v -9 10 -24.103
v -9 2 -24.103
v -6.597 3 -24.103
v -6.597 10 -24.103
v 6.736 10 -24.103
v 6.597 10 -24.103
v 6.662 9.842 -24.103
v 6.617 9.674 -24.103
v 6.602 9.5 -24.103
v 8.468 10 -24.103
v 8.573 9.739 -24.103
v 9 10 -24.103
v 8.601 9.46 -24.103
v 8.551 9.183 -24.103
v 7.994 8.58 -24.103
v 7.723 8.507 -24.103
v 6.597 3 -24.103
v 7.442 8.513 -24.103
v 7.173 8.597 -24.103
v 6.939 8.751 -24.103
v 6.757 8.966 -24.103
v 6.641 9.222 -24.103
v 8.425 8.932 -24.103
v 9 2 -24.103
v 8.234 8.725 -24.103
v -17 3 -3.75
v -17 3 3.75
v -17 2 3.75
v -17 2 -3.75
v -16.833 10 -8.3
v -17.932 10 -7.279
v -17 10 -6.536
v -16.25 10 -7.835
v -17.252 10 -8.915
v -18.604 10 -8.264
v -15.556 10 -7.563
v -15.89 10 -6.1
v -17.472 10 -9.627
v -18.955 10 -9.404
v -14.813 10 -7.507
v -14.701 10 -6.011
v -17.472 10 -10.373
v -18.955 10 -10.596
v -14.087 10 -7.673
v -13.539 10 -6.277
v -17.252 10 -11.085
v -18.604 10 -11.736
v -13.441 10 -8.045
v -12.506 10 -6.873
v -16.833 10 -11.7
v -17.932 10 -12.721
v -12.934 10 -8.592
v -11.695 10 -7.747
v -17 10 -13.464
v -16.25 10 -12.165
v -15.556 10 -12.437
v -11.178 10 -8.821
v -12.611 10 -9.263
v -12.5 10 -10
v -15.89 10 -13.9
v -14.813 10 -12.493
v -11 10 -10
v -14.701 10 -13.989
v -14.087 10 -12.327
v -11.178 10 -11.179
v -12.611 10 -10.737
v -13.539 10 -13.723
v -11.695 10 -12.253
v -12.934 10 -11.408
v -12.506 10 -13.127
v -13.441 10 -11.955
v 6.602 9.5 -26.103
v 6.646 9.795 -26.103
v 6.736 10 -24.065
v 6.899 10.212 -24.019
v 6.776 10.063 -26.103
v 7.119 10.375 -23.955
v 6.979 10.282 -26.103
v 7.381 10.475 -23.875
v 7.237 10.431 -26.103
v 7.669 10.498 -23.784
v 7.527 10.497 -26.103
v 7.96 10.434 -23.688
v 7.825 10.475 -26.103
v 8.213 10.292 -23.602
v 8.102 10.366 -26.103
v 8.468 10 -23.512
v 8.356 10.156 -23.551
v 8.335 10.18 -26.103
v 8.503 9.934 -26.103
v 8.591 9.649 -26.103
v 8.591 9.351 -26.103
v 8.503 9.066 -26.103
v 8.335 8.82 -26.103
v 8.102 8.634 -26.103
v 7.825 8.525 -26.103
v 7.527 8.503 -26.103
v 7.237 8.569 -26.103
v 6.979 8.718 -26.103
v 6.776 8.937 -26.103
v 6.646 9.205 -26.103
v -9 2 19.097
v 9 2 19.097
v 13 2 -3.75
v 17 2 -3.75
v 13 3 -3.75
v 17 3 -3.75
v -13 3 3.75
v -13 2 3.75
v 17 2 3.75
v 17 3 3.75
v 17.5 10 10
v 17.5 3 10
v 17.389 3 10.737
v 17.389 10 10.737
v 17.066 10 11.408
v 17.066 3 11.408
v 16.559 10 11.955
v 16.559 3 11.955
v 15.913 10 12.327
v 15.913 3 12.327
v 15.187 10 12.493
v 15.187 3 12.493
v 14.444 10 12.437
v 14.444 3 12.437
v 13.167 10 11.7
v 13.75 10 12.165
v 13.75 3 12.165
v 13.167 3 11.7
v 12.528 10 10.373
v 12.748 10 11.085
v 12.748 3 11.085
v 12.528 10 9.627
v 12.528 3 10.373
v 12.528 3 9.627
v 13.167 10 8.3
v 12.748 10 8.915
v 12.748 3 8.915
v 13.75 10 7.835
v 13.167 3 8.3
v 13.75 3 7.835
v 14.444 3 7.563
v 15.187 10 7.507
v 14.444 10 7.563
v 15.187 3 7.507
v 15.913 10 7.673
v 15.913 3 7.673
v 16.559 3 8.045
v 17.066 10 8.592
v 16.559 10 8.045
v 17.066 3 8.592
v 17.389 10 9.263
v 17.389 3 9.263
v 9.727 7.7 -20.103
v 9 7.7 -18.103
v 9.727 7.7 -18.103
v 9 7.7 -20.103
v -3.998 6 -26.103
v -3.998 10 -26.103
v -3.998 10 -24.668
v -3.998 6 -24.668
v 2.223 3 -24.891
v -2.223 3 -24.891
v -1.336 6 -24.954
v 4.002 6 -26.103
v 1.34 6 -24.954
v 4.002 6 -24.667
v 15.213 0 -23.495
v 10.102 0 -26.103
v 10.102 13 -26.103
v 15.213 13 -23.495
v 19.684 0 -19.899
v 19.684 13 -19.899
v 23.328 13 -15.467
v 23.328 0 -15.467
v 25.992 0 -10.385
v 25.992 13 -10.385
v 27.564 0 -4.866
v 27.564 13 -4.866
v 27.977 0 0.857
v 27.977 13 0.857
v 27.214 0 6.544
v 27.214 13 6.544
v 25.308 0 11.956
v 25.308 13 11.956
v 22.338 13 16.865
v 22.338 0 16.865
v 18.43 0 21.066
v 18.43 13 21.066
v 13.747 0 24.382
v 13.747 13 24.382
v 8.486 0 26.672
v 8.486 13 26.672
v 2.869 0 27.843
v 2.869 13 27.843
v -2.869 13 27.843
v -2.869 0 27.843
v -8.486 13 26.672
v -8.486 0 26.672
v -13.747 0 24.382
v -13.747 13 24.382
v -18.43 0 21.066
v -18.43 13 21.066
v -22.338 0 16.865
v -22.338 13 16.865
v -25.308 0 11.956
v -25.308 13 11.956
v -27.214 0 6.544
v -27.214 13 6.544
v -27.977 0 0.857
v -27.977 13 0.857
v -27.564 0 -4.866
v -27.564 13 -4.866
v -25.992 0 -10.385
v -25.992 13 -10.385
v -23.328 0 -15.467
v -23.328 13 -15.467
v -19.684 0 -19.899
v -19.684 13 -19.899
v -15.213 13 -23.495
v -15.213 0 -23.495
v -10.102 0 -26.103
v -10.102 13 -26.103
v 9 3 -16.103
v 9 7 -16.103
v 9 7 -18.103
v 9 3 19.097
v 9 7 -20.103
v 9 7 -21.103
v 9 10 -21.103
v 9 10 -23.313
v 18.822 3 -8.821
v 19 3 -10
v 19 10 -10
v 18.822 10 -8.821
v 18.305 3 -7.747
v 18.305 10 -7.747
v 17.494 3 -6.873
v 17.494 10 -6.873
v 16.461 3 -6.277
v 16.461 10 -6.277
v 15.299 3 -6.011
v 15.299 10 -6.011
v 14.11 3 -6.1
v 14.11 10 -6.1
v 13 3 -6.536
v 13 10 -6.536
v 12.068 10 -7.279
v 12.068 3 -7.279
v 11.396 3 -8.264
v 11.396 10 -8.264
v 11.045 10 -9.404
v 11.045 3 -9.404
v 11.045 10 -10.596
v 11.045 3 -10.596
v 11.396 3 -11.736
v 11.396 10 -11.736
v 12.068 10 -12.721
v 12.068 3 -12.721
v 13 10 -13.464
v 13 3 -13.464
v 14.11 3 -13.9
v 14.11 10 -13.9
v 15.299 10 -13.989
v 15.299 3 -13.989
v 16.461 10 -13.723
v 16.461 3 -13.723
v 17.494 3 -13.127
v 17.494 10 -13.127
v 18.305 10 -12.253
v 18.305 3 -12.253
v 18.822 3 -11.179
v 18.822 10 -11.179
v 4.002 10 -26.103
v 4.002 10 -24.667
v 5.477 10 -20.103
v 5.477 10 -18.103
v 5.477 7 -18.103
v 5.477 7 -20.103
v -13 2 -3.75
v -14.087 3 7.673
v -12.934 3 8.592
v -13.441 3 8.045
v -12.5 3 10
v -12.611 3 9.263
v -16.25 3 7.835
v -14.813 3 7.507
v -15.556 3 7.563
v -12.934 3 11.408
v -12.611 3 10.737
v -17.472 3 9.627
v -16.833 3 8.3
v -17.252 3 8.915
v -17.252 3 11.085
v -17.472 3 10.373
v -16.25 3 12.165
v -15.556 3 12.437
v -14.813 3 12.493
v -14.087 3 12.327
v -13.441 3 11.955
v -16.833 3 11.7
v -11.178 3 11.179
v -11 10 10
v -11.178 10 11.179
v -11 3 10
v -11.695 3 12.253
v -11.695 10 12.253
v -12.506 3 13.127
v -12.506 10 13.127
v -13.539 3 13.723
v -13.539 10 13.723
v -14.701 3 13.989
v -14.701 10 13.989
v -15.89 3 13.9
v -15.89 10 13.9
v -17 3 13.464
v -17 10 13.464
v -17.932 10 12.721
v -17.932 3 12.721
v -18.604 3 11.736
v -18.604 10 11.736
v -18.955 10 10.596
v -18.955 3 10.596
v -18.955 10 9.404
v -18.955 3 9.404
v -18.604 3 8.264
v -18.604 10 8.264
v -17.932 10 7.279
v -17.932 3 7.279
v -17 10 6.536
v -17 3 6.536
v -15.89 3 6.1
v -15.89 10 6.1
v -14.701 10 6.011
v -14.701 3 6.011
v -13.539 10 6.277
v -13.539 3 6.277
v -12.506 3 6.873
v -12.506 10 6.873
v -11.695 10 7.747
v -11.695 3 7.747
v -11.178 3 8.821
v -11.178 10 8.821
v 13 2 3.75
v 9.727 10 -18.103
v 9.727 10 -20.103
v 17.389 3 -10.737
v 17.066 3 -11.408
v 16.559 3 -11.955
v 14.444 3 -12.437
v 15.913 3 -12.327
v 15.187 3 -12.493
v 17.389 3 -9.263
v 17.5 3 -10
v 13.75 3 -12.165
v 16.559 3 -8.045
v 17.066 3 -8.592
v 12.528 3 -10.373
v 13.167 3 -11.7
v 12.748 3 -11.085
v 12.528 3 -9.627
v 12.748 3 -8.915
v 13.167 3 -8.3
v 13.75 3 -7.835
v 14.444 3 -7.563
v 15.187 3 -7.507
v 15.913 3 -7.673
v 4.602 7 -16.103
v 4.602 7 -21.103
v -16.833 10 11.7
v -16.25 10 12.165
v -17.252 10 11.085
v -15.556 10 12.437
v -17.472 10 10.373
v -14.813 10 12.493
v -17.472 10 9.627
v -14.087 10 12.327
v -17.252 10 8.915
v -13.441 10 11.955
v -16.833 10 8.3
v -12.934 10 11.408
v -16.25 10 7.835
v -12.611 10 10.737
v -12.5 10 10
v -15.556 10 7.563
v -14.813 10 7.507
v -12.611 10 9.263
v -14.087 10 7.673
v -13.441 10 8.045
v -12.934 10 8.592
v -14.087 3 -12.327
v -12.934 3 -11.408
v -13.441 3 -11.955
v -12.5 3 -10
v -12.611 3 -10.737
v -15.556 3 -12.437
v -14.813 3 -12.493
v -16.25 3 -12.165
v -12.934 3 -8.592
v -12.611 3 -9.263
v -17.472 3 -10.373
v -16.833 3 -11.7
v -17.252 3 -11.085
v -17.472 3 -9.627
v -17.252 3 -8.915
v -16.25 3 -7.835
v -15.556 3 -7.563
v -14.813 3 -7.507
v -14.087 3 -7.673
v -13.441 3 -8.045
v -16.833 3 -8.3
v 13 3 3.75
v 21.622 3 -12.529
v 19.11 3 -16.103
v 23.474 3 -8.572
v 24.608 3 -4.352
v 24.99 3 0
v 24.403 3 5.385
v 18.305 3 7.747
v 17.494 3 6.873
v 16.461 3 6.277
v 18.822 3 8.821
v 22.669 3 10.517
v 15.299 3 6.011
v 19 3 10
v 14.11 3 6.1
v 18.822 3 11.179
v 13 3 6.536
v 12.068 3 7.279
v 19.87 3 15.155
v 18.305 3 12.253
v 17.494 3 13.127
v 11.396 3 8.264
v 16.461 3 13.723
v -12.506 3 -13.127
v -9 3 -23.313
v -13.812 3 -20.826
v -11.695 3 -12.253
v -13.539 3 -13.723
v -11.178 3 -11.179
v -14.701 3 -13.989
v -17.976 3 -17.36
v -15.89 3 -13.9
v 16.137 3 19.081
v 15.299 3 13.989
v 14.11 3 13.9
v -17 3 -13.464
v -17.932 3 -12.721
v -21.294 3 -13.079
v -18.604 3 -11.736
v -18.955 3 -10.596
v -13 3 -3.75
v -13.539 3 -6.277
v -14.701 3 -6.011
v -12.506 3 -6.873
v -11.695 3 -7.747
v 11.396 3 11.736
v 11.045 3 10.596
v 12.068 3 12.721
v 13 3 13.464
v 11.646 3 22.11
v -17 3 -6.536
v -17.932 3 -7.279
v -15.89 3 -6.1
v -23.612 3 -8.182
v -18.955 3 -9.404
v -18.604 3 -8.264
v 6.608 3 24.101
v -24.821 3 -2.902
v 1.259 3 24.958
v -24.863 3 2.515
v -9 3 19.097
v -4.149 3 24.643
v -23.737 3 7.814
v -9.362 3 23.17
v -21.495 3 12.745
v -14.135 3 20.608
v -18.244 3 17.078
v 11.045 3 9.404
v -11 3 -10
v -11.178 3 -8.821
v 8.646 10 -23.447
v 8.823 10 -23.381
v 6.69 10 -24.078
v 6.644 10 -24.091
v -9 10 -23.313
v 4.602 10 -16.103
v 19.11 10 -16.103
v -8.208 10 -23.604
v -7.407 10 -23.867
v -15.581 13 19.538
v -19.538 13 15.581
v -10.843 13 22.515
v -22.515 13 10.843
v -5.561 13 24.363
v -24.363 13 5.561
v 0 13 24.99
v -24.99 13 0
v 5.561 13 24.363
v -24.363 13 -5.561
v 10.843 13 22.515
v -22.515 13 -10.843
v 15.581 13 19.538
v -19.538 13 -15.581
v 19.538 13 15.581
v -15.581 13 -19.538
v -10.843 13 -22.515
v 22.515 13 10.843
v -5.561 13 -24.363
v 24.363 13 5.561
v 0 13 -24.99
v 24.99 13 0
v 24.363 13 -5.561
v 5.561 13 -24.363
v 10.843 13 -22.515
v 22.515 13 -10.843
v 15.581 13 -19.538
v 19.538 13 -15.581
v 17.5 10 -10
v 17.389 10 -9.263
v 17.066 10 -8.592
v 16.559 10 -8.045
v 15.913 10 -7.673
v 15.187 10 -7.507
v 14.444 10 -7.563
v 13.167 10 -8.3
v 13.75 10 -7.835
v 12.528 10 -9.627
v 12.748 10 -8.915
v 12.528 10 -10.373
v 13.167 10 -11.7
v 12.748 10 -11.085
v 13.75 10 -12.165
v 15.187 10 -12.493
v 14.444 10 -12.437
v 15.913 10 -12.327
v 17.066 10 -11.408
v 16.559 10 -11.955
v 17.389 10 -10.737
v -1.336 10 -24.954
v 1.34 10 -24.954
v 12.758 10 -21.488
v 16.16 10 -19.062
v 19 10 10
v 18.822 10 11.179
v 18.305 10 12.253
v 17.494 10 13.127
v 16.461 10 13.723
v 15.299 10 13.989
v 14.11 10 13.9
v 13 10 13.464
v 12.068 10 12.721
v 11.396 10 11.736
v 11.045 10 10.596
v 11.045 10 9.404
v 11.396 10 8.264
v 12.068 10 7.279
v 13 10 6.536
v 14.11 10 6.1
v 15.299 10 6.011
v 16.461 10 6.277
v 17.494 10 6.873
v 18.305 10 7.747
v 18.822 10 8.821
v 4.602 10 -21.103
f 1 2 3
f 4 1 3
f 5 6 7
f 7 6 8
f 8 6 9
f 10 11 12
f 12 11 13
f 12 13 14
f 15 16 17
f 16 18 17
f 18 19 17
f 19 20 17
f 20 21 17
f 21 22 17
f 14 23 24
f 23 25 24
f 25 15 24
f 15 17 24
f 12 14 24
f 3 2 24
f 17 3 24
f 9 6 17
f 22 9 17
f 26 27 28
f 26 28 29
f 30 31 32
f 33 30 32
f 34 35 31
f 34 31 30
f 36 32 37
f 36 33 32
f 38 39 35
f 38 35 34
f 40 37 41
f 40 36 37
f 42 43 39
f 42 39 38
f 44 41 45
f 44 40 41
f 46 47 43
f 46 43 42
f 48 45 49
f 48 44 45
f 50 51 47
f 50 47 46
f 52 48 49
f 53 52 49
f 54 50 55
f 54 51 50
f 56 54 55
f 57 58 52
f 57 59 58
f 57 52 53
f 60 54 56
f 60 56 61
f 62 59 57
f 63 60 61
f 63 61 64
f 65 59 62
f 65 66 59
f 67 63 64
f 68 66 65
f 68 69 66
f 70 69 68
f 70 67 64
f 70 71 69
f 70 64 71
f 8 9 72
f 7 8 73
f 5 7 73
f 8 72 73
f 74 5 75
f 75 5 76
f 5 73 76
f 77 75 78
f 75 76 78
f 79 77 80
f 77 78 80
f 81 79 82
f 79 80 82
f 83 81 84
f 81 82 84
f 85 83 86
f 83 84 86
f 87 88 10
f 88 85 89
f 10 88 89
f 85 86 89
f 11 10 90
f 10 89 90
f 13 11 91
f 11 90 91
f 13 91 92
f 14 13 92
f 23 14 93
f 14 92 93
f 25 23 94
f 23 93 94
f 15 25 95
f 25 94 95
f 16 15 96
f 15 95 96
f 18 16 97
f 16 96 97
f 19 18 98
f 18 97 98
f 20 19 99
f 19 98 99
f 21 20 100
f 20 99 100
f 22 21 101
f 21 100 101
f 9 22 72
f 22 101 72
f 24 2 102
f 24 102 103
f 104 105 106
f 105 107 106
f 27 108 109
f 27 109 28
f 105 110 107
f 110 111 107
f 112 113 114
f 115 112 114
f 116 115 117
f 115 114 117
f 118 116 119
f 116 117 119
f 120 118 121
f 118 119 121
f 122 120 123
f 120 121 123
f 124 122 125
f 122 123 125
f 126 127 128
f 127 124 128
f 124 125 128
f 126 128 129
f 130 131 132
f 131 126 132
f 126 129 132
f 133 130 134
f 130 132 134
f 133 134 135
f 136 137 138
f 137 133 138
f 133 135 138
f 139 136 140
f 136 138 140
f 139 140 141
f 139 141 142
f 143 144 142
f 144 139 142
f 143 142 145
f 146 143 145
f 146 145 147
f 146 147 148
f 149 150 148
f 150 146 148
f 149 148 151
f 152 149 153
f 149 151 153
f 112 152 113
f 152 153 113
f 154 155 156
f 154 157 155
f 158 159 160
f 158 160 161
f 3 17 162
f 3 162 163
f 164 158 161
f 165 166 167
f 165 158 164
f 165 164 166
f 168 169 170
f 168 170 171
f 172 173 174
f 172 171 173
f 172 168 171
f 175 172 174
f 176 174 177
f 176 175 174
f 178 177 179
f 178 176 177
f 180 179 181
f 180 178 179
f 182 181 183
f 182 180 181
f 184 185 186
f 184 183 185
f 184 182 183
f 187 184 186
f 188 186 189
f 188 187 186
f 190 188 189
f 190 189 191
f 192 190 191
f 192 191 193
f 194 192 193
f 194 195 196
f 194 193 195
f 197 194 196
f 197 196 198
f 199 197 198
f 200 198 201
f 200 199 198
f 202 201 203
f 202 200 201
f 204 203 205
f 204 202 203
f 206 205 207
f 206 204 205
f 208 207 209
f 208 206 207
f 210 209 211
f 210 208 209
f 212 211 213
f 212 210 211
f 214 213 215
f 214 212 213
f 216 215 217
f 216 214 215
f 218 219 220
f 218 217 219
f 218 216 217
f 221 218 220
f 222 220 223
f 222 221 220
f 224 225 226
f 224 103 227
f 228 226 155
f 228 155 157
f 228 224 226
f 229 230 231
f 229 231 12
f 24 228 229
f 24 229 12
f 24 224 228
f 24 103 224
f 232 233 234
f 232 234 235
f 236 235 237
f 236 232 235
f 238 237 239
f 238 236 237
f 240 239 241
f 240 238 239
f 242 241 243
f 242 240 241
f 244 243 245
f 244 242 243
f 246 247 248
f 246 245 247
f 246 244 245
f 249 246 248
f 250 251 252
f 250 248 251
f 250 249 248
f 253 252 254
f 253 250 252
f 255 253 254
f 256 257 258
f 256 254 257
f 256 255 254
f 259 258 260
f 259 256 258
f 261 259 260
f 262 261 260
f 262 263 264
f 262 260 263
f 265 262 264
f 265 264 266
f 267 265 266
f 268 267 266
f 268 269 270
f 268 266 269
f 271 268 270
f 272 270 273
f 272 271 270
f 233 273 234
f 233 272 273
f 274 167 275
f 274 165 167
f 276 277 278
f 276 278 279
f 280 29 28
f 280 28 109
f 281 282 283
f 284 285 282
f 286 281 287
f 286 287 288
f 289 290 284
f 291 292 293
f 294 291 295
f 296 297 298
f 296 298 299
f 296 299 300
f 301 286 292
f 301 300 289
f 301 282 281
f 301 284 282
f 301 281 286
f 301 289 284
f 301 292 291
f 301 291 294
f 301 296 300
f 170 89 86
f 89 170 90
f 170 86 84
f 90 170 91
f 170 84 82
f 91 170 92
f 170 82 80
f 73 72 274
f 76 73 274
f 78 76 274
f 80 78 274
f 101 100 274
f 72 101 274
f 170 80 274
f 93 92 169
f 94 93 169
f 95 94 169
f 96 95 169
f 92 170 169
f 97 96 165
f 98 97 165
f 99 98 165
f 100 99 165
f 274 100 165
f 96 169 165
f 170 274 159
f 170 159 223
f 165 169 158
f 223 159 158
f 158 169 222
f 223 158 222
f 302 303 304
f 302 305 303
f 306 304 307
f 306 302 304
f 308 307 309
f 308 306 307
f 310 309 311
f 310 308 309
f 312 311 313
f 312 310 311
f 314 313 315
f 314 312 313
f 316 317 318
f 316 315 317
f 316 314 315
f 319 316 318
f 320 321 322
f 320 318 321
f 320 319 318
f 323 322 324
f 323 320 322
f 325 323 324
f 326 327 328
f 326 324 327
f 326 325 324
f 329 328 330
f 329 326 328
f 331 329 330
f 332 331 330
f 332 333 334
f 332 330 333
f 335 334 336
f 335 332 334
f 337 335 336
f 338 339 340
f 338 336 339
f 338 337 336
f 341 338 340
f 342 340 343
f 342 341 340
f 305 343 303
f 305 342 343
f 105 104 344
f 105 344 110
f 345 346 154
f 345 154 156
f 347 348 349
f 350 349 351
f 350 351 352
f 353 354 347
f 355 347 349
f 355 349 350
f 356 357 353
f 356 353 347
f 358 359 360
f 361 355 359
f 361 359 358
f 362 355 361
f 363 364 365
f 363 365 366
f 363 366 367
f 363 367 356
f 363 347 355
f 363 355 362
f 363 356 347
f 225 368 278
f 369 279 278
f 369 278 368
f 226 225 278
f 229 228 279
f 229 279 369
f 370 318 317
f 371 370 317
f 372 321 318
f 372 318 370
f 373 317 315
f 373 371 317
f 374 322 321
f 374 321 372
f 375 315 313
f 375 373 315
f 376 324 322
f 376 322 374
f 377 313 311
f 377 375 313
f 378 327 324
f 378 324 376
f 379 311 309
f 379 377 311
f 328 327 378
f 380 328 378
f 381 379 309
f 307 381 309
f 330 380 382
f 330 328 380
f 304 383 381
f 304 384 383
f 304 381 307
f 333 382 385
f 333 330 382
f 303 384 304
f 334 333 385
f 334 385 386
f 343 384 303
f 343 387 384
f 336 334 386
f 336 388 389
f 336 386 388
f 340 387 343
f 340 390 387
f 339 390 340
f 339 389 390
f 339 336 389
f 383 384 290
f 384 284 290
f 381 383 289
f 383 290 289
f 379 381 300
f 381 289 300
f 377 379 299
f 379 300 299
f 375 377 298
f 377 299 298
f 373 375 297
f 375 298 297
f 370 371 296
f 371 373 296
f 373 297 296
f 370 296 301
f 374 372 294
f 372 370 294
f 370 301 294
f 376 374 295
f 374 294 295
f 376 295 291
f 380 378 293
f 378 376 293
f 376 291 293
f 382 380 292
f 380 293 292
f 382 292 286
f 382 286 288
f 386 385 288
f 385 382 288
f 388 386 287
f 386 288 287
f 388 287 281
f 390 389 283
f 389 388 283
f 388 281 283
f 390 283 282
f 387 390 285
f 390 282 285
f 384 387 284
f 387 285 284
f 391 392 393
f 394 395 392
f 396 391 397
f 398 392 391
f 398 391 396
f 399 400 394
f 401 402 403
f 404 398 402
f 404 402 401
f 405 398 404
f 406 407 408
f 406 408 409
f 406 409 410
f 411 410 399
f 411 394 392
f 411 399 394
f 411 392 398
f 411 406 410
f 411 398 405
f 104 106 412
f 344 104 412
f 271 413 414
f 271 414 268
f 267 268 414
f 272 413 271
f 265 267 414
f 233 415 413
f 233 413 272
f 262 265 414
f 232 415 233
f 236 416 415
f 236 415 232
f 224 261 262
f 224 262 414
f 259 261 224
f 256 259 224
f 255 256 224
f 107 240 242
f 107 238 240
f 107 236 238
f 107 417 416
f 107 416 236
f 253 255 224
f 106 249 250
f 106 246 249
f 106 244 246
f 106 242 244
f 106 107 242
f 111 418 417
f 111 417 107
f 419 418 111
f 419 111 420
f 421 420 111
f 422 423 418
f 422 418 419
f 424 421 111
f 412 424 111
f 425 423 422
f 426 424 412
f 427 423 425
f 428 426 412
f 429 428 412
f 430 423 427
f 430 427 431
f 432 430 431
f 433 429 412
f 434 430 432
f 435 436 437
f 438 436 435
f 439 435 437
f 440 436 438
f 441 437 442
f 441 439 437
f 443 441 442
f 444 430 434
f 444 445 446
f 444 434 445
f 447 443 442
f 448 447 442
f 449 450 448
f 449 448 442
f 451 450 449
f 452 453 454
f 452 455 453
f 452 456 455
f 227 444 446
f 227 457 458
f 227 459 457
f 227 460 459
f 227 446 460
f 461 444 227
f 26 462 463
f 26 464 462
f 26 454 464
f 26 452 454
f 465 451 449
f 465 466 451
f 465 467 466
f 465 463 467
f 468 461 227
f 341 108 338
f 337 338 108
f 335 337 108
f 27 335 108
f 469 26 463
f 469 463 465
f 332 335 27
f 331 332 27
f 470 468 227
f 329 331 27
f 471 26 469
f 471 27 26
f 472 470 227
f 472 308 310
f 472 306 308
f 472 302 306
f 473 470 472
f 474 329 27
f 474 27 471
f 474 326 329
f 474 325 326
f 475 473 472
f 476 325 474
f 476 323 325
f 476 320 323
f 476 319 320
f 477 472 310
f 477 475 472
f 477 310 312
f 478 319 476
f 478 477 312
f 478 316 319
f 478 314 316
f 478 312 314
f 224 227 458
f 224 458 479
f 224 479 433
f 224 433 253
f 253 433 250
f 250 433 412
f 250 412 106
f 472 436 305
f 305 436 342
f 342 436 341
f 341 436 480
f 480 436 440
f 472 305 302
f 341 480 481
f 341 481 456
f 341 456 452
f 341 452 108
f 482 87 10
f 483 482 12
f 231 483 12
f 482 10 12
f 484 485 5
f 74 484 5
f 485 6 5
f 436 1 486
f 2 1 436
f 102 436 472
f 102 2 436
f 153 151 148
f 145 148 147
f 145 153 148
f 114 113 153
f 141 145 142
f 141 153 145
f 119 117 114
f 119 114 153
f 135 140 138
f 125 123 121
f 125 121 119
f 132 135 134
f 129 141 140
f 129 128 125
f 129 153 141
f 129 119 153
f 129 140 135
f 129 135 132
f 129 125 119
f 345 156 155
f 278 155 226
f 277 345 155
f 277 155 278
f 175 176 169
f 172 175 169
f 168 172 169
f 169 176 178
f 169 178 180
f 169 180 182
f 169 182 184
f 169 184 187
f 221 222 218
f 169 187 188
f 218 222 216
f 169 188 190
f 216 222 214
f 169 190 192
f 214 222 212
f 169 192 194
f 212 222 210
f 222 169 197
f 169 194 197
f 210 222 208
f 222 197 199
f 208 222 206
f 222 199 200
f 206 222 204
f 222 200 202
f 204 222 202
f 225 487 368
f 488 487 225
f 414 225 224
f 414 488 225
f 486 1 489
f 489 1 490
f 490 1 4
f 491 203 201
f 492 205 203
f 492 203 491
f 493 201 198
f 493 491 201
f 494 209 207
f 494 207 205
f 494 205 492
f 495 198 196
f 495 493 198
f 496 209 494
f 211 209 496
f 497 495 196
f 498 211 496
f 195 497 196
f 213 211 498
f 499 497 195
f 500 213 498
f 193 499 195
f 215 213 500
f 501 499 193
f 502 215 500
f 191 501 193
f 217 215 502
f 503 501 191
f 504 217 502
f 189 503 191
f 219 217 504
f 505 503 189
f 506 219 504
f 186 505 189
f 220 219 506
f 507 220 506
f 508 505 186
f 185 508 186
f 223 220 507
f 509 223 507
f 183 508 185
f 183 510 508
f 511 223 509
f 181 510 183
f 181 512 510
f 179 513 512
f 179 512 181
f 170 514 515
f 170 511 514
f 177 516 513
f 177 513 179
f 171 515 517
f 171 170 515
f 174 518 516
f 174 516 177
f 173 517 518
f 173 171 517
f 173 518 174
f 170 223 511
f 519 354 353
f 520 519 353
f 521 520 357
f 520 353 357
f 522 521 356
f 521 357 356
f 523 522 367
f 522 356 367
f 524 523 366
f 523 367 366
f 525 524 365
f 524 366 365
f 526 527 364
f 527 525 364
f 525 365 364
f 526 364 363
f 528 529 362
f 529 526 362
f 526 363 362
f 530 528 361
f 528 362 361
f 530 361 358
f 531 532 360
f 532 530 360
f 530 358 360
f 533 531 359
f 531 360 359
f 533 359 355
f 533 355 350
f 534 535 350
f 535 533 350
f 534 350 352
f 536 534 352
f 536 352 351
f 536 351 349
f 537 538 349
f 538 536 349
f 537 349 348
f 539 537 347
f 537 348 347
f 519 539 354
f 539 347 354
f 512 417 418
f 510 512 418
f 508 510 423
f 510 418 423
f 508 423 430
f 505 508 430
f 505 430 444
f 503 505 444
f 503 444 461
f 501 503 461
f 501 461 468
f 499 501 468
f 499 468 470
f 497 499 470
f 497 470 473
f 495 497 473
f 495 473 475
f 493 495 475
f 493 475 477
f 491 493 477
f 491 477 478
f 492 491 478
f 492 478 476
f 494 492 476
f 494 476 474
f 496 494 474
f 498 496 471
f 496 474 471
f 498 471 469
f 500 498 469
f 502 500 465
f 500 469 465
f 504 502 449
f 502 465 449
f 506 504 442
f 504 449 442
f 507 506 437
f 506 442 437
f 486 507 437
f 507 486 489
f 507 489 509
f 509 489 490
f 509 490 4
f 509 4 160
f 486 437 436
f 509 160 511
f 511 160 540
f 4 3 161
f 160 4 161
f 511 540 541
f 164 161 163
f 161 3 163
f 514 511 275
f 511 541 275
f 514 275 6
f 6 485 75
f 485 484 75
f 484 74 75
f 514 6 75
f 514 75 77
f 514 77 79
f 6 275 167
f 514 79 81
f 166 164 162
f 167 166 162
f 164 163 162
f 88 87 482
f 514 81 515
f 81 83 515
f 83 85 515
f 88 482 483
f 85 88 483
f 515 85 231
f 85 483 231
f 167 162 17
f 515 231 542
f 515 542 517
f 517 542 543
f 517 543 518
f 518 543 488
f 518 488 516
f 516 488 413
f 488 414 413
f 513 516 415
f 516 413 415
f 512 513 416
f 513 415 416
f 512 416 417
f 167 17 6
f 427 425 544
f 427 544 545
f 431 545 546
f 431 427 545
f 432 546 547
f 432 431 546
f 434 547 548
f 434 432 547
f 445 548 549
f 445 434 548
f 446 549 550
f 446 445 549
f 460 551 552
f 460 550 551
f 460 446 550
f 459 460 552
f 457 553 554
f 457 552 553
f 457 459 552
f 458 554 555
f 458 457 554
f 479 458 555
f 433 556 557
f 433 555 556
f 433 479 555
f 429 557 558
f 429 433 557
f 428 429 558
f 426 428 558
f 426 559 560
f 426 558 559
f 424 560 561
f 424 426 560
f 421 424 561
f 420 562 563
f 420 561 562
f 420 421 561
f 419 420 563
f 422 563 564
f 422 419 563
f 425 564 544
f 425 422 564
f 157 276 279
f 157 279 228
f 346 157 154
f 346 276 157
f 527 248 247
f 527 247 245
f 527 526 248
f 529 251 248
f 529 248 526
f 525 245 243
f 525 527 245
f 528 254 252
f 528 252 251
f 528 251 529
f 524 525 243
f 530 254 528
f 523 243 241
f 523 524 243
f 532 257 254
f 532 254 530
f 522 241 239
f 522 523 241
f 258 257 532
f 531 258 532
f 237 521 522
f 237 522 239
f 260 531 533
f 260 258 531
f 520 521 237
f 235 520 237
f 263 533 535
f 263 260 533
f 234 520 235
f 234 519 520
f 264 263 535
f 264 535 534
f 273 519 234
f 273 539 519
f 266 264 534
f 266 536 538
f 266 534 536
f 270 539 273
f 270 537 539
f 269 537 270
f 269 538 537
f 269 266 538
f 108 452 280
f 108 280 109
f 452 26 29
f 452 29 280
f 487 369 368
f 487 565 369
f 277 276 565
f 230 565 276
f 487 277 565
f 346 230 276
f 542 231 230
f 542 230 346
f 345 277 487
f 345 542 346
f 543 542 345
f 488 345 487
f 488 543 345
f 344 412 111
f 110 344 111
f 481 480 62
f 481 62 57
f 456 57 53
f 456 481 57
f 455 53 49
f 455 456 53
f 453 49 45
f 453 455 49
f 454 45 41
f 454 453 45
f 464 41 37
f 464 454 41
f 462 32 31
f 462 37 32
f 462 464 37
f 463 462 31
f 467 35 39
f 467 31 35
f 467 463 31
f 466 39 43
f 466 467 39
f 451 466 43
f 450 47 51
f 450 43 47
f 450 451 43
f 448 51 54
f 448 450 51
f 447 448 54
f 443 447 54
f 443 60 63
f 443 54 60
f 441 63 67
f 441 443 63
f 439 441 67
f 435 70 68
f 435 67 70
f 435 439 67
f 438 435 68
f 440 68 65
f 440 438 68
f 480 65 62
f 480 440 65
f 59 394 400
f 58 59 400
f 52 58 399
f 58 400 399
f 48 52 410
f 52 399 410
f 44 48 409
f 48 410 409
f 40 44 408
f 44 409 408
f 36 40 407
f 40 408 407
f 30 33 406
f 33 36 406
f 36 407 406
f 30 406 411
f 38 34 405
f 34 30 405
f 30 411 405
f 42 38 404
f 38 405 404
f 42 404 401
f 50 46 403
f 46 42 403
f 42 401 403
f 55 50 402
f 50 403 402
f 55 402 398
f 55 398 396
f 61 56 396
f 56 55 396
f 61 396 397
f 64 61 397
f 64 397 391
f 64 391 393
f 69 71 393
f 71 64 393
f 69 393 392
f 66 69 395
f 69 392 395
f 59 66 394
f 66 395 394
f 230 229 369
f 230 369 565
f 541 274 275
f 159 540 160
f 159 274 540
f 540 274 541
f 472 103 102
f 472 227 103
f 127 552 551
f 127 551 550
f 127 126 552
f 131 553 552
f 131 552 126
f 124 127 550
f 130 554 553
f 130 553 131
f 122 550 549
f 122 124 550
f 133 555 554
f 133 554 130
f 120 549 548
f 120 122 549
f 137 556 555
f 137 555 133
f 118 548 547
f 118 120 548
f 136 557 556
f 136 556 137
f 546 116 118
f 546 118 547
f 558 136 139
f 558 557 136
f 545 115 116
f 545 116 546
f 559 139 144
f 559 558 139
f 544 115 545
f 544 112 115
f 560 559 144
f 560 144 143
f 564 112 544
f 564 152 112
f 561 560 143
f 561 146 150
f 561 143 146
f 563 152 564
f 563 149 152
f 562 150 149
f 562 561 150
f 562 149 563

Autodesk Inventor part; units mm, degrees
ref_plane "YZ Plane" through (0, 0, 0) normal (1, 0, 0) x (0, 1, 0)
ref_plane "XZ Plane" through (0, 0, 0) normal (0, 1, 0) x (-1, 0, 0)
ref_plane "XY Plane" through (0, 0, 0) normal (0, 0, 1) x (1, 0, 0)
sketch "Sketch1" plane through (0, 0, 0) normal (0, 1, 0) x (-1, 0, 0)
  line L0 (8.5, 21.5) -> (-8.5, 21.5) construction
  line L1 (-8.5, 21.5) -> (-8.5, -21.5) construction
  line L2 (8.5, -21.5) -> (8.5, 21.5) construction
  line L3 (-8.5, 21.5) -> (8.5, -21.5) construction
  line L4 (-8.5, -21.5) -> (8.5, 21.5) construction
  line L5 (-3.5, -21.5) -> (-3.5, -23.5) construction
  line L6 (-3.5, -23.5) -> (3.5, -23.5) construction
  line L7 (3.5, -23.5) -> (3.5, -21.5) construction
  line L8 (-8.5, -21.5) -> (-3.5, -21.5) construction
  line L9 (3.5, -21.5) -> (8.5, -21.5) construction
  arc A0 (9.5253, -23.1034) -> (-9.5253, -23.1034) centre (0, 0) ccw
  line L10 (9.5253, -23.1034) -> (-9.5253, -23.1034)
  line L11 (-10.102, -26.1034) -> (10.102, -26.1034)
  arc A1 (10.102, -26.1034) -> (-10.102, -26.1034) centre (0, 0) ccw
  dimension "d0" = 43
  dimension "d1" = 17
  dimension "d2" = 7
  dimension "d3" = 2
  dimension "d4" = 3
  dimension "d13" = 20.204
extrude "BASE PLATE" add sketch "Sketch1" along normal blind 3 contours L10 A0 | A1 L11
sketch "Sketch3" plane through (0, 3, 0) normal (0, 1, 0) x (1, 0, 0)
  line L0 (10.102, 26.1034) -> (-10.102, 26.1034) projected
  arc A0 (-10.102, 26.1034) -> (10.102, 26.1034) centre (0, 0) ccw
  arc A1 (-10.102, 26.1034) -> (10.102, 26.1034) centre (0, 0) ccw projected
  line L1 (-10.102, 26.1034) -> (10.102, 26.1034)
  circle A2 centre (0, 0) radius 24.99
  dimension "d58" = 3
extrude "WALLS" add sketch "Sketch3" along normal blind 10
sketch "Sketch6" plane through (0, 3, 0) normal (0, 1, 0) x (1, 0, 0)
  line L0 (-8.5, 21.5) -> (8.5, 21.5) construction
  line L1 (8.5, 21.5) -> (8.5, -21.5) construction
  line L2 (8.5, -21.5) -> (-8.5, -21.5) construction
  line L3 (-8.5, -21.5) -> (-8.5, 21.5) construction
  line L4 (-8.5, -21.5) -> (8.5, 21.5) construction
  line L5 (-8.5, 21.5) -> (8.5, -21.5) construction
  line L6 (0, 0) -> (-15, 0) construction
  line L7 (-15, 0) -> (-15, 10) construction
  line L8 (-15, 10) -> (0, 10) construction
  line L9 (0, 10) -> (0, 0) construction
  circle A0 centre (-15, 10) radius 4
  circle A1 centre (-15, 10) radius 2.5
  circle A2 centre (-15, -10) radius 4
  circle A3 centre (-15, -10) radius 2.5
  circle A4 centre (15, 10) radius 4
  circle A5 centre (15, 10) radius 2.5
  circle A6 centre (15, -10) radius 2.5
  circle A7 centre (15, -10) radius 4
  dimension "d18" = 43
  dimension "d19" = 17
  dimension "d20" = 15
  dimension "d21" = 10
  dimension "d22" = 8
  dimension "d23" = 5
extrude "BUTTON POSTS" add sketch "Sketch6" along normal blind 7
sketch "Sketch7" plane through (0, 3, 0) normal (0, 1, 0) x (1, 0, 0)
  line L0 (-9, 24.1034) -> (9, 24.1034)
  line L1 (9, 24.1034) -> (9, -19.0966)
  line L2 (9, -19.0966) -> (-9, -19.0966)
  line L3 (-9, -19.0966) -> (-9, 24.1034)
  line L4 (-17, 3.75) -> (-13, 3.75)
  line L5 (-13, 3.75) -> (-13, -3.75)
  line L6 (-13, -3.75) -> (-17, -3.75)
  line L7 (-17, -3.75) -> (-17, 3.75)
  line L8 (-24.99, 0) -> (24.99, 0) construction
  line L9 (0, 23.1034) -> (0, -24.99) construction
  line L10 (17, 3.75) -> (13, 3.75)
  line L11 (13, 3.75) -> (13, -3.75)
  line L12 (13, -3.75) -> (17, -3.75)
  line L13 (17, -3.75) -> (17, 3.75)
  line L14 (-9.5253, 24.1034) -> (9.5253, 24.1034) projected
  line L15 (10.102, 26.1034) -> (-10.102, 26.1034) projected
  dimension "d26" = 43.2
  dimension "d27" = 18
  dimension "d28" = 7.5
  dimension "d29" = 4
  dimension "d30" = 3.75
  dimension "d63" = 2
  dimension "d65" = 9
  dimension "d77" = 13
extrude "INDENTATION FOR LINEUP" cut sketch "Sketch7" against normal blind 1
sketch "Sketch9" plane through (0, 2, 0) normal (0, 1, 0) x (1, 0, 0)
  line L0 (-9, 24.1034) -> (9, 24.1034) projected
  line L1 (-9, -19.0966) -> (9, -19.0966)
  line L2 (9, -19.0966) -> (9, 24.1034)
  line L3 (9, 24.1034) -> (-9, 24.1034)
  line L4 (-9, 24.1034) -> (-9, -19.0966)
  point P0 (0, 0)
extrude "FLAT SURFACE FOR ARDUINO" cut sketch "Sketch9" along normal blind 8
sketch "Sketch11" plane through (10.102, 0, -26.1034) normal (0, 0, -1) x (-1, 0, 0)
  line L0 (19.102, 2) -> (1.102, 2) construction
  line L1 (0, 0) -> (0, 13) construction
  line L2 (20.204, 0) -> (20.204, 13) construction
  line L3 (6.1, 10) -> (14.1, 10)
  line L4 (14.1, 10) -> (14.1, 6)
  line L5 (14.1, 6) -> (6.1, 6)
  line L6 (6.1, 6) -> (6.1, 10)
  line L7 (0, 0) -> (20.204, 0) construction
  circle A0 centre (2.5, 9.5) radius 1
  point P0 (10.102, 0)
  dimension "d69" = 4
  dimension "d70" = 4
  dimension "d71" = 6.1
  dimension "d72" = 2
  dimension "d74" = 2.5
  dimension "d78" = 7.5
  dimension "d89" = 8
extrude "I/O HOLES" cut sketch "Sketch11" against normal blind 10
sketch "Sketch12" plane through (0, 3, 0) normal (0, 1, 0) x (1, 0, 0)
  line L0 (19.1097, 16.1034) -> (9, 16.1034)
  line L1 (9, 16.1034) -> (9, 23.3131)
  line L2 (-9, 24.1034) -> (9, 24.1034) construction
  line L3 (-9, -19.0966) -> (-9, 24.1034) construction
  line L4 (9, -19.0966) -> (-9, -19.0966) construction
  line L5 (9, 24.1034) -> (9, -19.0966) construction
  line L6 (10.102, 26.1034) -> (-10.102, 26.1034) projected
  circle A0 centre (0, 0) radius 24.99 construction
  arc A1 (-9, 23.3131) -> (9, 23.3131) centre (0, 0) ccw projected
  arc A2 (19.1097, 16.1034) -> (9, 23.3131) centre (0, 0) ccw
  line L7 (9, 23.3131) -> (9, -19.0966) projected
  point P0 (13, 21.3424)
  dimension "d88" = 10
extrude "Extrusion11" add sketch "Sketch12" along normal blind 7
sketch "Sketch16" plane through (9, 2, -24.1034) normal (-1, 0, 0) x (0, 0, 1)
  line L0 (0, 8) -> (0, 6.5) construction
  line L1 (0.7903, 8) -> (8, 8) construction
  line L2 (6, 8) -> (6, 5.7) construction
  line L3 (6, 5.7) -> (4.3, 5.7) construction
  line L4 (4.3, 5.7) -> (4.3, 8) construction
  line L5 (0.7903, 8) -> (8, 8) construction
  line L6 (8, 1) -> (8, 8) construction
  line L7 (0.7903, 8) -> (8, 8) construction
  line L8 (14.8538, 7.25) -> (0, 7.25) construction
  line L9 (0, 0) -> (0, 8) construction
  line L10 (3, 8) -> (8, 8)
  line L11 (8, 8) -> (8, 5)
  line L12 (8, 5) -> (3, 5)
  line L13 (3, 5) -> (3, 8)
  point P0 (24.1034, -2)
  dimension "d96" = 3
  dimension "d97" = 5
extrude "Extrusion13" add sketch "Sketch16" along normal blind 4.398
sketch "Sketch18" plane through (0, 10, 0) normal (0, 1, 0) x (1, 0, 0)
  line L0 (9.727, 18.1034) -> (5.477, 18.1034)
  line L1 (5.477, 18.1034) -> (5.477, 20.1034)
  line L2 (5.477, 20.1034) -> (9.727, 20.1034)
  line L3 (9.727, 20.1034) -> (9.727, 18.1034)
  line L4 (19.1097, 16.1034) -> (4.602, 16.1034) projected
  line L5 (4.602, 16.1034) -> (4.602, 21.1034) projected
  line L6 (8.468, 23.5115) -> (8.468, 24.1034) projected
  line L7 (6.736, 24.1034) -> (6.736, 24.065) projected
  line L8 (8.468, 24.1034) -> (6.736, 24.1034) projected
  line L9 (6.602, 26.1034) -> (8.602, 26.1034) projected
  line L10 (7.602, 26.1034) -> (7.602, 13.109) construction
  point P0 (0, 0)
  dimension "d104" = 2
  dimension "d105" = 4.25
  dimension "d106" = 2
  dimension "d108" = 2.125
extrude "Extrusion15" cut sketch "Sketch18" against normal blind 2.3
sketch "Sketch20" plane through (0, 7.7, 0) normal (0, 1, 0) x (1, 0, 0)
  line L0 (9, 24.1034) -> (9, -19.0966) projected
  line L1 (5.477, 20.1034) -> (9.727, 20.1034) projected
  line L2 (5.477, 18.1034) -> (5.477, 20.1034) projected
  line L3 (9, 16.1034) -> (9, 21.1034) projected
  line L4 (9, 20.1034) -> (5.477, 20.1034)
  line L5 (5.477, 20.1034) -> (5.477, 18.1034)
  line L6 (5.477, 18.1034) -> (9, 18.1034)
  line L7 (9, 18.1034) -> (9, 20.1034)
  point P0 (0, 0)
extrude "Extrusion16" cut sketch "Sketch20" against normal up to next
equation "\"d30\" = 0.5 * d28"
equation "\"d65\" = 0.5 * d27"
equation "\"d108\" = 0.5 * d105"
properties part number "Base"
